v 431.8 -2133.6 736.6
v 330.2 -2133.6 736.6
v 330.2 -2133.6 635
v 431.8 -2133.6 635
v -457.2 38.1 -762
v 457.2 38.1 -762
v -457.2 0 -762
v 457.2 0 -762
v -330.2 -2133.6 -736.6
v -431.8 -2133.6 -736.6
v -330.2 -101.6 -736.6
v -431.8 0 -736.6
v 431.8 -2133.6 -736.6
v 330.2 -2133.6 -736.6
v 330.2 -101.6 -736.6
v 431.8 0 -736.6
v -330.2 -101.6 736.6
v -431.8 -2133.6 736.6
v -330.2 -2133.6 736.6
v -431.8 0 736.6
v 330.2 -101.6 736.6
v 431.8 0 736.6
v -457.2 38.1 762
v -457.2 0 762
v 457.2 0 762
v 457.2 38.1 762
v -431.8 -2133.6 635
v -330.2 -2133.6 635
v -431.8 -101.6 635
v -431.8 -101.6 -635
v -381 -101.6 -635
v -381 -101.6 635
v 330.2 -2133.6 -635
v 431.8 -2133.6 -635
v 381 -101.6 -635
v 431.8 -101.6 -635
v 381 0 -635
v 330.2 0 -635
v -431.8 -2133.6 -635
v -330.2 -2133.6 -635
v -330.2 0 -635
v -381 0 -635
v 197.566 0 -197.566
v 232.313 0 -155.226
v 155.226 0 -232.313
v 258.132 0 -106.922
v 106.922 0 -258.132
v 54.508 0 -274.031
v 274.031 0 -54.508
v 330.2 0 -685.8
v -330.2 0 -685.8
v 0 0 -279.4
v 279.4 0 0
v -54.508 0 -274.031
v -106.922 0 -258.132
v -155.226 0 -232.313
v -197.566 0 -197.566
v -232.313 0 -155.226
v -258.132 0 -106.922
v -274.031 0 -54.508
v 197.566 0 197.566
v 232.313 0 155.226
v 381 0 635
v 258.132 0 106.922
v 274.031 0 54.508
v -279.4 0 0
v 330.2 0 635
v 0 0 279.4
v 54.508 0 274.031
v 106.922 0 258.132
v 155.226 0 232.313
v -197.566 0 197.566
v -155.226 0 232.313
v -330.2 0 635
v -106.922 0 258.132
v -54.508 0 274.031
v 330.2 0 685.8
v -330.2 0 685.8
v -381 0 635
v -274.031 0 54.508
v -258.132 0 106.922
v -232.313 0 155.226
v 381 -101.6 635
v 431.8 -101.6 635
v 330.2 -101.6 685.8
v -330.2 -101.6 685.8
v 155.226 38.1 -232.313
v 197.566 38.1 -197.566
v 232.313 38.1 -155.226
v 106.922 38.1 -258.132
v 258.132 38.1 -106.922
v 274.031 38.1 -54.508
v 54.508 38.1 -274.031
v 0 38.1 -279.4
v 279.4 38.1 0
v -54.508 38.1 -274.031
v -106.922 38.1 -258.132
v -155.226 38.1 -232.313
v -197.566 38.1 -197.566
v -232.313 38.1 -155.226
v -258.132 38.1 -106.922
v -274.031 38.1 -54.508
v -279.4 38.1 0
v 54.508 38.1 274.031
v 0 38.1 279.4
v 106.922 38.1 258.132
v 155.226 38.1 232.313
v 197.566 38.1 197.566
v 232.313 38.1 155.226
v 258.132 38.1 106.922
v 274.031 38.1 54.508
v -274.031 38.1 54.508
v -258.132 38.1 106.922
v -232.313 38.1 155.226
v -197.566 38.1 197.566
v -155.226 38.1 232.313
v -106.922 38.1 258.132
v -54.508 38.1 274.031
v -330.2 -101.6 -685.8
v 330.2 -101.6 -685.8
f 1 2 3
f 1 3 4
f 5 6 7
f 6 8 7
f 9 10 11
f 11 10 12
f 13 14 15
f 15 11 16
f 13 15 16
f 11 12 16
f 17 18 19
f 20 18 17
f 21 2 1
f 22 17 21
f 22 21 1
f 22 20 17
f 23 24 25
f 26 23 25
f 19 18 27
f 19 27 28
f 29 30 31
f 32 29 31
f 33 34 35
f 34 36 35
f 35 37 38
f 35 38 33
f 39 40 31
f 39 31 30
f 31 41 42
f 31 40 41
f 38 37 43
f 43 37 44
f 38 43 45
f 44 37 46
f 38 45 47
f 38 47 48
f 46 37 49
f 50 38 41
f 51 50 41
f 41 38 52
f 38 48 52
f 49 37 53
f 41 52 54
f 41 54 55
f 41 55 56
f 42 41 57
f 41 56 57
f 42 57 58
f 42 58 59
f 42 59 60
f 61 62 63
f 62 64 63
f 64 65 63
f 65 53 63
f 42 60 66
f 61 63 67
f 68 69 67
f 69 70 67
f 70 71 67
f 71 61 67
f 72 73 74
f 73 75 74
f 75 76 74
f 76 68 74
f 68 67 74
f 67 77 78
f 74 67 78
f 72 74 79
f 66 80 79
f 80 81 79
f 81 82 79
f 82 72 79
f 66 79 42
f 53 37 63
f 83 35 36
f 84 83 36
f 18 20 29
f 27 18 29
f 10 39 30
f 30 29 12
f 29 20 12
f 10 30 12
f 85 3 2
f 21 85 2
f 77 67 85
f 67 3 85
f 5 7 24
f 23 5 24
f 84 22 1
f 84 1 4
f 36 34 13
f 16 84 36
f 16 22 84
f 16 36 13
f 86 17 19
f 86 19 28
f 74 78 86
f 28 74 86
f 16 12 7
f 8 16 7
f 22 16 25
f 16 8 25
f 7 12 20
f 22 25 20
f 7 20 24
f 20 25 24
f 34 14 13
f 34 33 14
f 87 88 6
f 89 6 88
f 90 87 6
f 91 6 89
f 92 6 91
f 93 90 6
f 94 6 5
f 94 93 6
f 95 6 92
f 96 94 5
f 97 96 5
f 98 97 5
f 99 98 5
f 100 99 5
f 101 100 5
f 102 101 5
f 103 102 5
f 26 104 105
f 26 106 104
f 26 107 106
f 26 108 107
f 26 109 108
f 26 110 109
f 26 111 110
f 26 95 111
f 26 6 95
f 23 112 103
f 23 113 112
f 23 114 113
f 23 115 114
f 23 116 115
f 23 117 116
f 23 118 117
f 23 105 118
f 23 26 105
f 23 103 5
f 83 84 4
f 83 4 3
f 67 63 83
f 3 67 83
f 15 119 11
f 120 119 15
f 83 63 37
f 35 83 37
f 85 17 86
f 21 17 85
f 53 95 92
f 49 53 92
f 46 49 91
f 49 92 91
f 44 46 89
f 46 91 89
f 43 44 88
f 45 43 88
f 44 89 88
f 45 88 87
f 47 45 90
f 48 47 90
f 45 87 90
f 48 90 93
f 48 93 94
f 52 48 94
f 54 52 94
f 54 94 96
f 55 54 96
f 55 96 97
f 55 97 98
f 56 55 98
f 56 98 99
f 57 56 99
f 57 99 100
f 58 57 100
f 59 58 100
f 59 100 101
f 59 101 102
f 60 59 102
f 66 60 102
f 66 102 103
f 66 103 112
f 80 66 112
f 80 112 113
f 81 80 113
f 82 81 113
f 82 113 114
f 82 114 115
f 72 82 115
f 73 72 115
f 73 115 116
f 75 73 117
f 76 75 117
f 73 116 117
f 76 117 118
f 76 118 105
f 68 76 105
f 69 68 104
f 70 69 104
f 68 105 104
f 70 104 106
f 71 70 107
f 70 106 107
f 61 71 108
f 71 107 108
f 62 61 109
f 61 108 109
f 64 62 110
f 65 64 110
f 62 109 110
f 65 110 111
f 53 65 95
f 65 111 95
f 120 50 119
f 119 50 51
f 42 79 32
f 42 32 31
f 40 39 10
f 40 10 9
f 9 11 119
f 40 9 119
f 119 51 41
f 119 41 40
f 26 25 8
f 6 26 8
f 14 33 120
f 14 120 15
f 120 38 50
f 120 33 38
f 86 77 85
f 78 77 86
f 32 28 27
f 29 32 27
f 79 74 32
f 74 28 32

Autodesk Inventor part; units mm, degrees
ref_plane "YZ Plane" through (0, 0, 0) normal (1, 0, 0) x (0, 1, 0)
ref_plane "XZ Plane" through (0, 0, 0) normal (0, 1, 0) x (-1, 0, 0)
ref_plane "XY Plane" through (0, 0, 0) normal (0, 0, 1) x (1, 0, 0)
sketch "Sketch1" plane through (0, 0, 0) normal (0, 1, 0) x (-1, 0, 0)
  line L0 (457.2, 762) -> (-457.2, 762)
  line L1 (-457.2, 762) -> (-457.2, -762)
  line L2 (-457.2, -762) -> (457.2, -762)
  line L3 (457.2, -762) -> (457.2, 762)
  line L4 (457.2, 762) -> (-457.2, -762) construction
  line L5 (-457.2, 762) -> (457.2, -762) construction
  point P0 (0, 0)
  dimension "d0" = 914.4
  dimension "d1" = 1524
extrude "Extrusion1" add sketch "Sketch1" along normal blind 38.1
sketch "Sketch2" plane through (0, 0, 0) normal (0, -1, 0) x (1, 0, 0)
  line L0 (-381, 685.8) -> (381, 685.8) construction
  line L1 (381, 685.8) -> (381, -685.8) construction
  line L2 (381, -685.8) -> (-381, -685.8) construction
  line L3 (-381, -685.8) -> (-381, 685.8) construction
  line L4 (-381, 685.8) -> (381, -685.8) construction
  line L5 (381, 685.8) -> (-381, -685.8) construction
  line L6 (330.2, 736.6) -> (431.8, 736.6)
  line L7 (431.8, 736.6) -> (431.8, 635)
  line L8 (431.8, 635) -> (330.2, 635)
  line L9 (330.2, 635) -> (330.2, 736.6)
  line L10 (330.2, 736.6) -> (431.8, 635) construction
  line L11 (431.8, 736.6) -> (330.2, 635) construction
  line L12 (431.8, -635) -> (330.2, -635)
  line L13 (330.2, -635) -> (330.2, -736.6)
  line L14 (330.2, -736.6) -> (431.8, -736.6)
  line L15 (431.8, -736.6) -> (431.8, -635)
  line L16 (431.8, -635) -> (330.2, -736.6) construction
  line L17 (330.2, -635) -> (431.8, -736.6) construction
  line L18 (-431.8, -736.6) -> (-330.2, -736.6)
  line L19 (-330.2, -736.6) -> (-330.2, -635)
  line L20 (-330.2, -635) -> (-431.8, -635)
  line L21 (-431.8, -635) -> (-431.8, -736.6)
  line L22 (-431.8, -736.6) -> (-330.2, -635) construction
  line L23 (-330.2, -736.6) -> (-431.8, -635) construction
  line L24 (-431.8, 736.6) -> (-330.2, 736.6)
  line L25 (-330.2, 736.6) -> (-330.2, 635)
  line L26 (-330.2, 635) -> (-431.8, 635)
  line L27 (-431.8, 635) -> (-431.8, 736.6)
  line L28 (-431.8, 736.6) -> (-330.2, 635) construction
  line L29 (-330.2, 736.6) -> (-431.8, 635) construction
  point P0 (0, 0)
  dimension "d6" = 762
  dimension "d7" = 1371.6
  dimension "d8" = 101.6
  dimension "d9" = 101.6
  dimension "d10" = 101.6
  dimension "d11" = 101.6
  dimension "d12" = 101.6
  dimension "d13" = 101.6
  dimension "d14" = 101.6
  dimension "d15" = 101.6
extrude "Extrusion2" add sketch "Sketch2" along normal blind 2133.6
sketch "Sketch3" plane through (0, 0, 0) normal (0, -1, 0) x (1, 0, 0)
  line L0 (431.8, 635) -> (330.2, 635) projected
  line L1 (431.8, 635) -> (381, 635)
  line L2 (381, 635) -> (381, -635)
  line L3 (381, -635) -> (431.8, -635)
  line L4 (431.8, -635) -> (431.8, 635)
  line L5 (0, 0) -> (0, -69.3079) construction
  line L6 (-431.8, 635) -> (-330.2, 635)
  line L7 (-431.8, 635) -> (-381, 635)
  line L8 (-381, 635) -> (-381, -635)
  line L9 (-381, -635) -> (-431.8, -635)
  line L10 (-431.8, -635) -> (-431.8, 635)
  line L11 (330.2, -736.6) -> (330.2, -635) projected
  line L12 (-330.2, -736.6) -> (330.2, -736.6)
  line L13 (330.2, -736.6) -> (330.2, -685.8)
  line L14 (330.2, -685.8) -> (-330.2, -685.8)
  line L15 (-330.2, -685.8) -> (-330.2, -736.6)
  line L16 (0, 0) -> (54.1332, 0) construction
  line L17 (330.2, 736.6) -> (330.2, 635)
  line L18 (-330.2, 736.6) -> (330.2, 736.6)
  line L19 (330.2, 736.6) -> (330.2, 685.8)
  line L20 (330.2, 685.8) -> (-330.2, 685.8)
  line L21 (-330.2, 685.8) -> (-330.2, 736.6)
  dimension "d18" = 50.8
  dimension "d19" = 1270
  dimension "d20" = 50.8
extrude "Extrusion3" add sketch "Sketch3" along normal blind 101.6
sketch "Sketch4" plane through (0, 38.1, 0) normal (0, 1, 0) x (1, 0, 0)
  circle A0 centre (0, 0) radius 279.4
  dimension "d23" = 558.8
extrude "Extrusion4" cut sketch "Sketch4" against normal blind 101.6
properties part number "table" material "Laminated Veneer Lumber"
